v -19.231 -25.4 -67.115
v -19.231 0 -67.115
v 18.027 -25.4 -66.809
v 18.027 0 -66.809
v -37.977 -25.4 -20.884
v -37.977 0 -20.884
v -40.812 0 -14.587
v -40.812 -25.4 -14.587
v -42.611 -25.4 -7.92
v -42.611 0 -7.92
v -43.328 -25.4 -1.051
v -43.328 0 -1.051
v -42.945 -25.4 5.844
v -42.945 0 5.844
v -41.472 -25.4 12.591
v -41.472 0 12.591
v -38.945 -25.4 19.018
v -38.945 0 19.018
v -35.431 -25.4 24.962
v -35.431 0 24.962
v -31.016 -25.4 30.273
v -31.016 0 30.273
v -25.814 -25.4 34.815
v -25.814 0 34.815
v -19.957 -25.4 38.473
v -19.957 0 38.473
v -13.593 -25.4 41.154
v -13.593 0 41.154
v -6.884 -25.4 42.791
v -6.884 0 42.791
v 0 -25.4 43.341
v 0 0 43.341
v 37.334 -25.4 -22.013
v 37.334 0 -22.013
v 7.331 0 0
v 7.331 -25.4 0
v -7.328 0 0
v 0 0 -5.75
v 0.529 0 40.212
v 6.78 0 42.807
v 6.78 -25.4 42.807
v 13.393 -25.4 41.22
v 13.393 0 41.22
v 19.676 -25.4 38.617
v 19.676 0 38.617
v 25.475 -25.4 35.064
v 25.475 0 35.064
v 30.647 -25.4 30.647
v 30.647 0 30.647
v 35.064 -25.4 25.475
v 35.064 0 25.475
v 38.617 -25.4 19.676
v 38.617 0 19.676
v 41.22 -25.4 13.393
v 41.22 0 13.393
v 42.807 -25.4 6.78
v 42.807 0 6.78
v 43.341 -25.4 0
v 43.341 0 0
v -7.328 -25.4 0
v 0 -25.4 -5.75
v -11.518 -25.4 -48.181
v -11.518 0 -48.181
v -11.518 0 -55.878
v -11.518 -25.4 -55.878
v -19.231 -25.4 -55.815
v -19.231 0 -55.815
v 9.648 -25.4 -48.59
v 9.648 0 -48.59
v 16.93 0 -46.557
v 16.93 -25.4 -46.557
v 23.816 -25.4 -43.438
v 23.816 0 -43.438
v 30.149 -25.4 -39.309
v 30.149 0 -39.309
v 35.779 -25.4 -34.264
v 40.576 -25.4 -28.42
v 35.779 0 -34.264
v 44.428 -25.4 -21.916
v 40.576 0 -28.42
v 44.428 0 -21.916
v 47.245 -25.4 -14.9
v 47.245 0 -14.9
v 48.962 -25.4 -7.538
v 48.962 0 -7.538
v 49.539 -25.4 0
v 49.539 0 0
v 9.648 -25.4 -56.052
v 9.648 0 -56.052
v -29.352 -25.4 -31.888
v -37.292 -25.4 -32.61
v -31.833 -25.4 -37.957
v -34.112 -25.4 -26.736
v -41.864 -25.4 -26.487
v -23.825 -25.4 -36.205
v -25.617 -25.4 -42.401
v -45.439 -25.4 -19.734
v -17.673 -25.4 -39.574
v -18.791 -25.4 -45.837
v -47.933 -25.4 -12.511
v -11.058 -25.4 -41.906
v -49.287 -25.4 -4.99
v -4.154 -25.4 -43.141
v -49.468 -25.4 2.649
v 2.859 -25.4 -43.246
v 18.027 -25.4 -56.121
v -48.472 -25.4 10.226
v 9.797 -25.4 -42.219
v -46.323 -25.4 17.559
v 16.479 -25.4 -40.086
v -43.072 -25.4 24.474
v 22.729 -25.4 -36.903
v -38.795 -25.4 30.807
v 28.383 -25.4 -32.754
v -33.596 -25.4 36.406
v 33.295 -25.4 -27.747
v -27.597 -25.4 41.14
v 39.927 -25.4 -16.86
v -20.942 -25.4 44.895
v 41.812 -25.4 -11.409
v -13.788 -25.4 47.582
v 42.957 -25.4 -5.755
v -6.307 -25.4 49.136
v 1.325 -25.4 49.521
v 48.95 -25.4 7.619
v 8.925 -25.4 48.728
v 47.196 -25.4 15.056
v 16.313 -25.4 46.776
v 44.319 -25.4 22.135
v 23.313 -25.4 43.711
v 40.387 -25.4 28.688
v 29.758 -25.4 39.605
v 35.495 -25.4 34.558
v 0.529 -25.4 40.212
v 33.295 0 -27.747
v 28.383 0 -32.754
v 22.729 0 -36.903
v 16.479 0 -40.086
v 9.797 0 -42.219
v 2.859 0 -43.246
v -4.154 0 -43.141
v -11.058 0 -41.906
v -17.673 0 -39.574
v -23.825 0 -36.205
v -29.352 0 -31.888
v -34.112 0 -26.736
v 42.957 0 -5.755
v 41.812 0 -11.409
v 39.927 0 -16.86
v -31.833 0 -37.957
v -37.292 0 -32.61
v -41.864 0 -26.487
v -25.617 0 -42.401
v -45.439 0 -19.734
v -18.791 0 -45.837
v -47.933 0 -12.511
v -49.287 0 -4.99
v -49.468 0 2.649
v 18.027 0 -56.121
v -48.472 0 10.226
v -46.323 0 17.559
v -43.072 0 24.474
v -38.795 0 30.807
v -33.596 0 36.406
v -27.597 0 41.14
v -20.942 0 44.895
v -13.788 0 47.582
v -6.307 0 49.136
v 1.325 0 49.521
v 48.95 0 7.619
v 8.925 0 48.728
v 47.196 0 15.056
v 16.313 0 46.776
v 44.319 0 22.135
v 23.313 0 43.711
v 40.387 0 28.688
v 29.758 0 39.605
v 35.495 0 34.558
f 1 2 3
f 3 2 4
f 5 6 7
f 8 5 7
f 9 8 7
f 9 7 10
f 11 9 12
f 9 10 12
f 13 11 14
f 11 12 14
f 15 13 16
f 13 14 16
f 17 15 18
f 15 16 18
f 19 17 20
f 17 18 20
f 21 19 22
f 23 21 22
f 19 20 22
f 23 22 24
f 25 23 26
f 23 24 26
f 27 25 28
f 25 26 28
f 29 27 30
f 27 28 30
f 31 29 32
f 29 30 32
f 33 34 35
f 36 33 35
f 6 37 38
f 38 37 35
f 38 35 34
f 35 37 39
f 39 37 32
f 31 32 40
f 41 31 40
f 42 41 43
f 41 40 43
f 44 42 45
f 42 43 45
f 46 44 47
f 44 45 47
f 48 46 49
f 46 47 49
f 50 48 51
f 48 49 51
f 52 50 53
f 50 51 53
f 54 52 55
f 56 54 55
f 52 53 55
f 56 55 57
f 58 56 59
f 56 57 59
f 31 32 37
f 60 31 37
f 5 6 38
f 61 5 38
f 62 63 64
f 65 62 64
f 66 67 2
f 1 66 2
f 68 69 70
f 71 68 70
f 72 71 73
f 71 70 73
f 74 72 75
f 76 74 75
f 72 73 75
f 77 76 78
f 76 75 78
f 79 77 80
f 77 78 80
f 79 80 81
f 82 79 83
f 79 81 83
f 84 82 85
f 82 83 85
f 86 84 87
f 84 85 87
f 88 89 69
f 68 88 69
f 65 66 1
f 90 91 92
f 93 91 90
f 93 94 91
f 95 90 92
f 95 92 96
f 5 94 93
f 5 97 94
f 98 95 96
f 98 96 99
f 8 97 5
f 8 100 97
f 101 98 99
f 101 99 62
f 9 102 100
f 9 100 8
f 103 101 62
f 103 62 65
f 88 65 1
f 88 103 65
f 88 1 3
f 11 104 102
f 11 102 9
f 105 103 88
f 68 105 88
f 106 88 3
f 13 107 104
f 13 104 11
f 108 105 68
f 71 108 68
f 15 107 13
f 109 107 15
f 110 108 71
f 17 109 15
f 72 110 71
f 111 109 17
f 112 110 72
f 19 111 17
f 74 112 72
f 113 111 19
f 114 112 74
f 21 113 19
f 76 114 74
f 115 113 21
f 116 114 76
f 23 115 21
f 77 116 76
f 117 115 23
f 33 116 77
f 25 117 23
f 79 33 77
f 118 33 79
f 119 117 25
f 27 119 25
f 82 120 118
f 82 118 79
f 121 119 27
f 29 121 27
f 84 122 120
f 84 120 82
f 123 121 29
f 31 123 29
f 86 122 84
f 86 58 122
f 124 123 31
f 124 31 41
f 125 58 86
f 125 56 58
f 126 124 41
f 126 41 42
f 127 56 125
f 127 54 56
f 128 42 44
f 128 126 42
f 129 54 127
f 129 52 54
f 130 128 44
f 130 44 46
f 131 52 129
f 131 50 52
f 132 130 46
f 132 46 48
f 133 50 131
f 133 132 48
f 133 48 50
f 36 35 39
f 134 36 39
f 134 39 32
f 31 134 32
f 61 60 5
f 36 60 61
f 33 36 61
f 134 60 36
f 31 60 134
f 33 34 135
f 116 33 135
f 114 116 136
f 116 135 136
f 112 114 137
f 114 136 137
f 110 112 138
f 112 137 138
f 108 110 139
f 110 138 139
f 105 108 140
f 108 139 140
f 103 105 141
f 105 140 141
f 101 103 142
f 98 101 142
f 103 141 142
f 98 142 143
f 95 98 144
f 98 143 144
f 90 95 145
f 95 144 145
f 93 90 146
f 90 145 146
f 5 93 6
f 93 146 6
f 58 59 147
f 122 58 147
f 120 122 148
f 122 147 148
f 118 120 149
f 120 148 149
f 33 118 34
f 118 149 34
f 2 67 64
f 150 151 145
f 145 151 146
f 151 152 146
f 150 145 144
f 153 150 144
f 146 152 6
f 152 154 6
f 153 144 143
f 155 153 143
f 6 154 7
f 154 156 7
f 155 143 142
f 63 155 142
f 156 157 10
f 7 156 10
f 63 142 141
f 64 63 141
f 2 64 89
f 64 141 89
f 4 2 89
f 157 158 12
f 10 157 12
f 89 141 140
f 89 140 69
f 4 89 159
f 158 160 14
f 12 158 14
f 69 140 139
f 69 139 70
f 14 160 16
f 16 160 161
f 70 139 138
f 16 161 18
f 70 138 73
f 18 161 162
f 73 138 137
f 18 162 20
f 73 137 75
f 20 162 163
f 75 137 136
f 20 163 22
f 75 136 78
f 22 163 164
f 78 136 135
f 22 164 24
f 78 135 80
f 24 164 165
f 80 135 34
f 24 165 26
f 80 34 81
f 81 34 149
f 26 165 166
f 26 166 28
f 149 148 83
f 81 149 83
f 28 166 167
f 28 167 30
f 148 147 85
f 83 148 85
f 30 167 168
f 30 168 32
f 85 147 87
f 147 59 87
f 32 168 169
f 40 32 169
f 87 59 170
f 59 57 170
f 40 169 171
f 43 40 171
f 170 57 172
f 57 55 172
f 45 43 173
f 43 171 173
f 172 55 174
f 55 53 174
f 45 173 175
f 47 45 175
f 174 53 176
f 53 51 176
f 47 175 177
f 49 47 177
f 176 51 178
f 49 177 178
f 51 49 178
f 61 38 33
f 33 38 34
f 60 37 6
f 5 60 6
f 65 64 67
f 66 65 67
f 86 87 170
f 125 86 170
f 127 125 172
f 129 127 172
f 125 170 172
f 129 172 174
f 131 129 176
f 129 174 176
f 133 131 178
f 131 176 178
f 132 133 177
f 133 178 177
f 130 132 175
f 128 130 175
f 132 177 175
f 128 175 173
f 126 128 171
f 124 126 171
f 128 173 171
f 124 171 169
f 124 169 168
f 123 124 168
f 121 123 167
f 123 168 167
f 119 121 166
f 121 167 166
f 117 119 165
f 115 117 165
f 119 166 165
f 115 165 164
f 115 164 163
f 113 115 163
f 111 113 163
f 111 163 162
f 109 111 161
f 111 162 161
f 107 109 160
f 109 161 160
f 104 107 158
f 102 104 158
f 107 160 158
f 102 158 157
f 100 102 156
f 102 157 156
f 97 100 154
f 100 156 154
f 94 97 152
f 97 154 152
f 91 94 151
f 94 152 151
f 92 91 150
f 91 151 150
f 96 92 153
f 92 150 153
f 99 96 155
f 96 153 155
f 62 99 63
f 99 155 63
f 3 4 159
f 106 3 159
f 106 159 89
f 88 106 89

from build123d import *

# Parameters (mm, degrees)
F1_DEPTH = 25.4


with BuildPart() as f1:
    # F0 (on Front) → F1 (new body)
    with BuildSketch(Plane.XZ):
        with BuildLine():
            ThreePointArc((49.53907, 0), (-30.687987, 38.889162), (-11.518473, -48.181369))
            ThreePointArc((-11.518473, -48.181369), (-0.957145, -49.529823), (9.648395, -48.59041))
            ThreePointArc((9.648395, -48.59041), (38.28898, -31.433636), (49.53907, 0))
        make_face()
        with BuildLine():
            ThreePointArc((0, 43.34087), (30.646623, 30.646623), (43.34087, 0))
            ThreePointArc((43.34087, 0), (41.812279, -11.408958), (37.33433, -22.01315))
            ThreePointArc((37.33433, -22.01315), (-0.649712, -43.336), (-37.977464, -20.884043))
            ThreePointArc((-37.977464, -20.884043), (-37.306592, 22.060127), (0, 43.34087))
        make_face(mode=Mode.SUBTRACT)
        Polygon((0.529305, 40.211648), (0, 43.34087), (-7.327536, 0), (-37.977464, -20.884043), (-1.239218, -0.681454), (0, 0), align=None)
        Polygon((-1.239218, -0.681454), (37.33433, -22.01315), (7.331061, 0), (0.529305, 40.211648), (0, 0), align=None)
        Polygon((0, -5.750131), (37.33433, -22.01315), (-1.239218, -0.681454), (-37.977464, -20.884043), align=None)
        with BuildLine():
            Line((-11.518473, -48.181369), (-11.518473, -55.878425))
            Line((-11.518473, -55.878425), (9.648395, -56.05187))
            Line((9.648395, -56.05187), (9.648395, -48.59041))
            ThreePointArc((9.648395, -48.59041), (-0.957145, -49.529823), (-11.518473, -48.181369))
        make_face()
        Polygon((-11.518473, -55.878425), (-19.230583, -55.815231), (-19.230583, -67.114565), (18.026687, -66.809085), (18.026687, -56.120523), (9.648395, -56.05187), align=None)
    extrude(amount=F1_DEPTH)


solid = f1.part
